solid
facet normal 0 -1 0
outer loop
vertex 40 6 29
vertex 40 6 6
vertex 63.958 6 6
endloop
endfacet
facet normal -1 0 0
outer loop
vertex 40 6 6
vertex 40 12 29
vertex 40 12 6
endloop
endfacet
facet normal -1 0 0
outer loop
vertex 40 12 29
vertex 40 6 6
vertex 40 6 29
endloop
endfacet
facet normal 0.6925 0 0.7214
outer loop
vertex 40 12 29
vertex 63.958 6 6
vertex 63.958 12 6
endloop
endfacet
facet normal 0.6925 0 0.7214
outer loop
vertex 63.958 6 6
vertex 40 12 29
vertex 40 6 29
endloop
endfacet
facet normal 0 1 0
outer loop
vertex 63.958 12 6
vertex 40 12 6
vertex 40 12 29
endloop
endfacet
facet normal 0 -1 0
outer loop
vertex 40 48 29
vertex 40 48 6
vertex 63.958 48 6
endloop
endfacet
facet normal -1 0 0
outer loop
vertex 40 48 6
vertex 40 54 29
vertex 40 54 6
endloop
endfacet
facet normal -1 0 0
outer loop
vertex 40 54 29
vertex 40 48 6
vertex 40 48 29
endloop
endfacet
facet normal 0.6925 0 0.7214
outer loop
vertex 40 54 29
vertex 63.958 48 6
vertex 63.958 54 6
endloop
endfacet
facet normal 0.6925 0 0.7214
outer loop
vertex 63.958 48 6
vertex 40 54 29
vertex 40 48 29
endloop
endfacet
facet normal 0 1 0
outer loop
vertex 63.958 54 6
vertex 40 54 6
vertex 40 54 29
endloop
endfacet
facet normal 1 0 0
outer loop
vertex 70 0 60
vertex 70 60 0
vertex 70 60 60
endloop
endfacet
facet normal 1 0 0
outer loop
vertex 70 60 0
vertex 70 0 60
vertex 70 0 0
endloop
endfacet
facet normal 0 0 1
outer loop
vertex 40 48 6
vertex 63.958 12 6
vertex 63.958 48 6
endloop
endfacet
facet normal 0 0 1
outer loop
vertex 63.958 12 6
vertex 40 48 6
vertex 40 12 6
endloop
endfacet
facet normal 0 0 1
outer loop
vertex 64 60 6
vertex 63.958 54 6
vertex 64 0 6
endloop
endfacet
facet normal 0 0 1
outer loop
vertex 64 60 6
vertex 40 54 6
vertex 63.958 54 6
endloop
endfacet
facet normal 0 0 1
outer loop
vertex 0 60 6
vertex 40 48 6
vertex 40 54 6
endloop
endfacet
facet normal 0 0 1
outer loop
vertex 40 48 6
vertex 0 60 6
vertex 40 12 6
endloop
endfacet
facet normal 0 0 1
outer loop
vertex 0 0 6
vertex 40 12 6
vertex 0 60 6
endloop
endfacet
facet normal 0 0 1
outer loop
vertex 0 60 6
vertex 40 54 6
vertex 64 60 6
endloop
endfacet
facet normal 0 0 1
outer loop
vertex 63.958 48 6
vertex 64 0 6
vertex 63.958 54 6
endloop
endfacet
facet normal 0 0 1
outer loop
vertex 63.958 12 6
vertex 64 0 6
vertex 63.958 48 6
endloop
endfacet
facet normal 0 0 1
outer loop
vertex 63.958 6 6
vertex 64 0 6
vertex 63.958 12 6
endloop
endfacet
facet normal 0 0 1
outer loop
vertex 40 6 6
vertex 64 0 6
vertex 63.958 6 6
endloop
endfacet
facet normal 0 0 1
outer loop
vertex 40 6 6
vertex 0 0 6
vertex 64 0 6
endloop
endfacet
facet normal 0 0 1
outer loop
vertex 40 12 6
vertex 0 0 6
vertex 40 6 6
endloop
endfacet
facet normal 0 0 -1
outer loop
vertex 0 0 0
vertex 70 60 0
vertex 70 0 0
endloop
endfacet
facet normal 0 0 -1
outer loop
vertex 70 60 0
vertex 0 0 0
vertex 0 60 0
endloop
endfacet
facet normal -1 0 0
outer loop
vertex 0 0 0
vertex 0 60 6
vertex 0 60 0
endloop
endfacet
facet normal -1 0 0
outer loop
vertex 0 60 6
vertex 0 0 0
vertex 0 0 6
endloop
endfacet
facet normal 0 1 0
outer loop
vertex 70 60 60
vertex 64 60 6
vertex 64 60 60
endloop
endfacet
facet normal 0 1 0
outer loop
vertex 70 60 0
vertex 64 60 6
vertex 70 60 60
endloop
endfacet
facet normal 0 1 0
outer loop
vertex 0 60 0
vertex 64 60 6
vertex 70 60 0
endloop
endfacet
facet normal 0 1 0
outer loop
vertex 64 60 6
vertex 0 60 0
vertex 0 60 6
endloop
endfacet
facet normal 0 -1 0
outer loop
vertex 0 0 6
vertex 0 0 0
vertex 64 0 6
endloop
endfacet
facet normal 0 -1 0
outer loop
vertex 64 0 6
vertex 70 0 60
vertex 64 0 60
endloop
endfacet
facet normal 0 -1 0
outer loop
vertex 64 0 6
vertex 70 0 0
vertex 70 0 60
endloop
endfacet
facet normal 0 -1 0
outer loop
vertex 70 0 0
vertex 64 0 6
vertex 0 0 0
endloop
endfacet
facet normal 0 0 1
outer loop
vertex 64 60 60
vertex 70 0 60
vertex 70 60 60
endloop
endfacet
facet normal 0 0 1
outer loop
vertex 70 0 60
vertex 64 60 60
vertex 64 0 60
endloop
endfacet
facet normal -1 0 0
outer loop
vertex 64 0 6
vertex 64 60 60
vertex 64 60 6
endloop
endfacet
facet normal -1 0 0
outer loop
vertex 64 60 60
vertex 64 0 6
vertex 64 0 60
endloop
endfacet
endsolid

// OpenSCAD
$fn = 32;

// ----------------------------------------------------------------------
// Rib bracket: 2-gusset L bracket
// ----------------------------------------------------------------------

// --- parameters (mm) ---
base_l = 70;              // foot length, X
base_w = 60;              // foot width, Y
base_t = 6;               // foot thickness
plate_t = 6;              // upright plate thickness
plate_h = 60;             // overall height
gus_l = 24;               // gusset leg along the foot
gus_h = 24;               // gusset height
gus_t = 6;                // gusset thickness
gus_edge = 6;             // gusset margin from the foot edge
n_gus = 2;                // gusset count

gus_pitch = (base_w - 2 * gus_edge - gus_t) / (n_gus - 1);  // gusset pitch

union() {
  cube([base_l, base_w, base_t]);
  translate([base_l - plate_t, 0, base_t - 1])
    cube([plate_t, base_w, plate_h - base_t + 1]);
  for (i = [0 : n_gus - 1])
    translate([base_l - plate_t - gus_l, gus_edge + i * gus_pitch, base_t - 1])
      rotate([-90, 0, 0])
        linear_extrude(height = gus_t)
          polygon(points = [[0, 0], [gus_l + 1, 0], [0, -gus_h]]);
}
